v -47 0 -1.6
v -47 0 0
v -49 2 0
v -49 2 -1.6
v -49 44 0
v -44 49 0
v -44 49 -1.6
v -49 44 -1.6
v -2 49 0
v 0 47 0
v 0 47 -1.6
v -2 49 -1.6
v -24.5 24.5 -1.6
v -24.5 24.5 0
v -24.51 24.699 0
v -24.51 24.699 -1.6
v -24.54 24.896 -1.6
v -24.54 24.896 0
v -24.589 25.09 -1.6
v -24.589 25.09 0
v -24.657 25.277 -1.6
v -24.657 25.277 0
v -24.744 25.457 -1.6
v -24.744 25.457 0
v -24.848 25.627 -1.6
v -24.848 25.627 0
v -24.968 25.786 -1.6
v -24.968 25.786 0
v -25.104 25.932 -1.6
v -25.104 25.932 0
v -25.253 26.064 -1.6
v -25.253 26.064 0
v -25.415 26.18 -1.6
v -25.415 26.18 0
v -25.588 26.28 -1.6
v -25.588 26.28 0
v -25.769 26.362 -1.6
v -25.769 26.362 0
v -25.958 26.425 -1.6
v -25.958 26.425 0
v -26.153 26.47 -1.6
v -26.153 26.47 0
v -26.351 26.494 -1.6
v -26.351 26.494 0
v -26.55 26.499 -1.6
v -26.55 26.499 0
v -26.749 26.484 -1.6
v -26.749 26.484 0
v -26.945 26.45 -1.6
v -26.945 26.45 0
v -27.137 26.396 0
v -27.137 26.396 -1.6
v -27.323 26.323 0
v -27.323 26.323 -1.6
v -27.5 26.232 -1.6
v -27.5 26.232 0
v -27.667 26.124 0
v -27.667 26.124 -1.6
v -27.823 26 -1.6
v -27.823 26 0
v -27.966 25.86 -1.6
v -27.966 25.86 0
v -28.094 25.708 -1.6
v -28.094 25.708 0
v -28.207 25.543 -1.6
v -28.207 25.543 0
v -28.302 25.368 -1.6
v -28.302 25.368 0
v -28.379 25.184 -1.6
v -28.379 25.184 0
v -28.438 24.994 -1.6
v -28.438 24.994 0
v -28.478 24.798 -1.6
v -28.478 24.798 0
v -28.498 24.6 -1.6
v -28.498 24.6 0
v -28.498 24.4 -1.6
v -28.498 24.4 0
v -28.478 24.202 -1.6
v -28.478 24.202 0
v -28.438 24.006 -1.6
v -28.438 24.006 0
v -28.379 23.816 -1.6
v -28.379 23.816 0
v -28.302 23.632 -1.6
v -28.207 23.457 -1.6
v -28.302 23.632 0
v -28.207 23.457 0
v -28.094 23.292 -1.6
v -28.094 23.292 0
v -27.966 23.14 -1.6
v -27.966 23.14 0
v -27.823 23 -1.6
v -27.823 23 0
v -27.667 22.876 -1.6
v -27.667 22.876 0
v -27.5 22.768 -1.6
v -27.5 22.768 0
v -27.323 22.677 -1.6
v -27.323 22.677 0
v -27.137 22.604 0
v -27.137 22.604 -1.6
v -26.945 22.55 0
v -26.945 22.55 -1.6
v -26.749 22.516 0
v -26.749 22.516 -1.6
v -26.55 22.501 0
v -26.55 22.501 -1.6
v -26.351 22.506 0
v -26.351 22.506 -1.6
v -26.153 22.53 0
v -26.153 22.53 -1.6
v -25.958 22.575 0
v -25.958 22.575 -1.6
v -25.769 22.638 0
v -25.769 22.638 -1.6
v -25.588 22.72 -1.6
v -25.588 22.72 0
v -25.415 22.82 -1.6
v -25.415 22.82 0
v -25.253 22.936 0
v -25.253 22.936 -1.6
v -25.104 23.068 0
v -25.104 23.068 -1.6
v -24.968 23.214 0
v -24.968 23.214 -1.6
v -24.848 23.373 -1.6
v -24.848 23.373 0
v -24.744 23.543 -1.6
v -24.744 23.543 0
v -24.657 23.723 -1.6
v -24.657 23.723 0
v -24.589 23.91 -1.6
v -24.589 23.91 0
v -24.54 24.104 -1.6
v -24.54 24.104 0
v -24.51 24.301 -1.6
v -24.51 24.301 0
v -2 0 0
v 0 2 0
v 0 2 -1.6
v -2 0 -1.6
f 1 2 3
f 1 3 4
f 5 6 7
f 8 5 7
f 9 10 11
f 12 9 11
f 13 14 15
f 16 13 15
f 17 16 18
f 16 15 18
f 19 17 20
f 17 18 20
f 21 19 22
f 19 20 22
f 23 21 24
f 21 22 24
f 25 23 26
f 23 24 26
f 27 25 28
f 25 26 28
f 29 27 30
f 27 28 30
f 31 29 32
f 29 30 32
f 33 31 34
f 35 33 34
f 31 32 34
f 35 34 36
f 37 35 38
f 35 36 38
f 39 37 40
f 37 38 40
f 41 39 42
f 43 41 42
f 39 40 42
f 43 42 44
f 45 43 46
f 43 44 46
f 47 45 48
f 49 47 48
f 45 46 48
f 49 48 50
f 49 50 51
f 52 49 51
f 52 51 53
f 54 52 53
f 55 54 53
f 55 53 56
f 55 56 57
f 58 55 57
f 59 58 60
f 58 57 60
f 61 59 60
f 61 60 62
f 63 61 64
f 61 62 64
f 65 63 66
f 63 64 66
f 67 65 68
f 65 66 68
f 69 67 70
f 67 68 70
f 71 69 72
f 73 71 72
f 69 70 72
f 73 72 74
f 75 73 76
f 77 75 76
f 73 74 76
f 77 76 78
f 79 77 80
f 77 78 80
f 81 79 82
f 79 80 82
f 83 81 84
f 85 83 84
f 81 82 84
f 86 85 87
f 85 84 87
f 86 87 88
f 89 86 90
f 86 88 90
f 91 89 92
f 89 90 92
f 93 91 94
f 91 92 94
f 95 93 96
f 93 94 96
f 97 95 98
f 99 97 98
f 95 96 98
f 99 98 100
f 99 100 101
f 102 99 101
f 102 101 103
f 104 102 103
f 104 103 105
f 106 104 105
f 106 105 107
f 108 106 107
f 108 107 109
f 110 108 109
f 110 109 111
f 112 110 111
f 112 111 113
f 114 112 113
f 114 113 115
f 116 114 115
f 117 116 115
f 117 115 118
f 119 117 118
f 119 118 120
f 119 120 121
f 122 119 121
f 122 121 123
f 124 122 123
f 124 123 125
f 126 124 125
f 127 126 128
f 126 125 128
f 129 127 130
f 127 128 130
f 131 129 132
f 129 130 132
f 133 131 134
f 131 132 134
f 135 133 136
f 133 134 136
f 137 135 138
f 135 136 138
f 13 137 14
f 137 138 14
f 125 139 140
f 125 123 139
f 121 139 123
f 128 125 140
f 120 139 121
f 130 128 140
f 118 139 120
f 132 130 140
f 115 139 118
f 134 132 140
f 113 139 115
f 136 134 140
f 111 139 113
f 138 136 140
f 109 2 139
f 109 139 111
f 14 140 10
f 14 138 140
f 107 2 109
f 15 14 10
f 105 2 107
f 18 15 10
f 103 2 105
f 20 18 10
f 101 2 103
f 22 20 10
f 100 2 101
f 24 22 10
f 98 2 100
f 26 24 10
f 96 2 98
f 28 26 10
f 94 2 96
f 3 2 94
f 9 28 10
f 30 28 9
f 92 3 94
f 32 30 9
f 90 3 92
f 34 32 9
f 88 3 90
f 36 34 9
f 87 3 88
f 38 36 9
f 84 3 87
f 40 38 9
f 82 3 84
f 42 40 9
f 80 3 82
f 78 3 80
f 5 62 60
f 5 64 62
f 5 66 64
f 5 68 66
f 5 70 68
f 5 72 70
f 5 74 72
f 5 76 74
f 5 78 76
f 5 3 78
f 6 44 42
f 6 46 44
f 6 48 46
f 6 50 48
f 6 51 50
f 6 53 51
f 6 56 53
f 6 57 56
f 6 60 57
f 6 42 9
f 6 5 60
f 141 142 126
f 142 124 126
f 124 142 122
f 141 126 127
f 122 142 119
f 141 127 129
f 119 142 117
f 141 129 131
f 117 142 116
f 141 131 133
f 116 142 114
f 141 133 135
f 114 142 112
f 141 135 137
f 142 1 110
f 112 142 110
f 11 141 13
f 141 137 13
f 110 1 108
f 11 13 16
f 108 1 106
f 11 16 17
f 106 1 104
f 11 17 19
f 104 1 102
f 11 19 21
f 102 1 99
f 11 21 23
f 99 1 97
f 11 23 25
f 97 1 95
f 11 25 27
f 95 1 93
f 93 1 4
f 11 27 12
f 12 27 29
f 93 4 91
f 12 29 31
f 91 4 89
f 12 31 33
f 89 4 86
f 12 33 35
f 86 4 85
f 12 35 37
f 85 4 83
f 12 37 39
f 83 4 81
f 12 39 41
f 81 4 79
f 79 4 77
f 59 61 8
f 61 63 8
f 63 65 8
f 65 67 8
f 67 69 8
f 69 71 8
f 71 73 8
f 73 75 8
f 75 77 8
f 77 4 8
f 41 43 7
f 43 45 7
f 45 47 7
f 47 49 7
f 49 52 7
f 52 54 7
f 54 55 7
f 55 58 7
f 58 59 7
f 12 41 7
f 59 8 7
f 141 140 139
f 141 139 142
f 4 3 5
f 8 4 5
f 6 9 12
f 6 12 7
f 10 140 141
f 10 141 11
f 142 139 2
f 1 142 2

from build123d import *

# Parameters (mm, degrees)
SKETCH1_W           = 49
SKETCH1_H           = 49
SKETCH1_R           = 2
BOSS_EXTRUDE1_DEPTH = 1.6
CHAMFER1_SIZE       = 5
CHAMFER2_SIZE       = 2


with BuildPart() as part:
    # Sketch1 → Boss-Extrude1 (new body)
    with BuildSketch(Plane(origin=(0, 0, 0), x_dir=(0, 1, 0), z_dir=(0, 0, 1))):
        with Locations((24.5, 24.5)):
            Rectangle(SKETCH1_W, SKETCH1_H)
        with Locations(Location((24.5, 26.5, 0), (0, 0, 270))):
            Circle(SKETCH1_R, mode=Mode.SUBTRACT)
    extrude(amount=-BOSS_EXTRUDE1_DEPTH)

    # Chamfer1
    chamfer1_edges = [part.edges().sort_by_distance(p)[0] for p in [
        (-49, 49, -0.8),
    ]]
    chamfer(chamfer1_edges, length=CHAMFER1_SIZE)

    # Chamfer2
    chamfer2_edges = [part.edges().sort_by_distance(p)[0] for p in [
        (-49, 0, -0.8),
        (0, 49, -0.8),
        (0, 0, -0.8),
    ]]
    chamfer(chamfer2_edges, length=CHAMFER2_SIZE)


solid = part.part
